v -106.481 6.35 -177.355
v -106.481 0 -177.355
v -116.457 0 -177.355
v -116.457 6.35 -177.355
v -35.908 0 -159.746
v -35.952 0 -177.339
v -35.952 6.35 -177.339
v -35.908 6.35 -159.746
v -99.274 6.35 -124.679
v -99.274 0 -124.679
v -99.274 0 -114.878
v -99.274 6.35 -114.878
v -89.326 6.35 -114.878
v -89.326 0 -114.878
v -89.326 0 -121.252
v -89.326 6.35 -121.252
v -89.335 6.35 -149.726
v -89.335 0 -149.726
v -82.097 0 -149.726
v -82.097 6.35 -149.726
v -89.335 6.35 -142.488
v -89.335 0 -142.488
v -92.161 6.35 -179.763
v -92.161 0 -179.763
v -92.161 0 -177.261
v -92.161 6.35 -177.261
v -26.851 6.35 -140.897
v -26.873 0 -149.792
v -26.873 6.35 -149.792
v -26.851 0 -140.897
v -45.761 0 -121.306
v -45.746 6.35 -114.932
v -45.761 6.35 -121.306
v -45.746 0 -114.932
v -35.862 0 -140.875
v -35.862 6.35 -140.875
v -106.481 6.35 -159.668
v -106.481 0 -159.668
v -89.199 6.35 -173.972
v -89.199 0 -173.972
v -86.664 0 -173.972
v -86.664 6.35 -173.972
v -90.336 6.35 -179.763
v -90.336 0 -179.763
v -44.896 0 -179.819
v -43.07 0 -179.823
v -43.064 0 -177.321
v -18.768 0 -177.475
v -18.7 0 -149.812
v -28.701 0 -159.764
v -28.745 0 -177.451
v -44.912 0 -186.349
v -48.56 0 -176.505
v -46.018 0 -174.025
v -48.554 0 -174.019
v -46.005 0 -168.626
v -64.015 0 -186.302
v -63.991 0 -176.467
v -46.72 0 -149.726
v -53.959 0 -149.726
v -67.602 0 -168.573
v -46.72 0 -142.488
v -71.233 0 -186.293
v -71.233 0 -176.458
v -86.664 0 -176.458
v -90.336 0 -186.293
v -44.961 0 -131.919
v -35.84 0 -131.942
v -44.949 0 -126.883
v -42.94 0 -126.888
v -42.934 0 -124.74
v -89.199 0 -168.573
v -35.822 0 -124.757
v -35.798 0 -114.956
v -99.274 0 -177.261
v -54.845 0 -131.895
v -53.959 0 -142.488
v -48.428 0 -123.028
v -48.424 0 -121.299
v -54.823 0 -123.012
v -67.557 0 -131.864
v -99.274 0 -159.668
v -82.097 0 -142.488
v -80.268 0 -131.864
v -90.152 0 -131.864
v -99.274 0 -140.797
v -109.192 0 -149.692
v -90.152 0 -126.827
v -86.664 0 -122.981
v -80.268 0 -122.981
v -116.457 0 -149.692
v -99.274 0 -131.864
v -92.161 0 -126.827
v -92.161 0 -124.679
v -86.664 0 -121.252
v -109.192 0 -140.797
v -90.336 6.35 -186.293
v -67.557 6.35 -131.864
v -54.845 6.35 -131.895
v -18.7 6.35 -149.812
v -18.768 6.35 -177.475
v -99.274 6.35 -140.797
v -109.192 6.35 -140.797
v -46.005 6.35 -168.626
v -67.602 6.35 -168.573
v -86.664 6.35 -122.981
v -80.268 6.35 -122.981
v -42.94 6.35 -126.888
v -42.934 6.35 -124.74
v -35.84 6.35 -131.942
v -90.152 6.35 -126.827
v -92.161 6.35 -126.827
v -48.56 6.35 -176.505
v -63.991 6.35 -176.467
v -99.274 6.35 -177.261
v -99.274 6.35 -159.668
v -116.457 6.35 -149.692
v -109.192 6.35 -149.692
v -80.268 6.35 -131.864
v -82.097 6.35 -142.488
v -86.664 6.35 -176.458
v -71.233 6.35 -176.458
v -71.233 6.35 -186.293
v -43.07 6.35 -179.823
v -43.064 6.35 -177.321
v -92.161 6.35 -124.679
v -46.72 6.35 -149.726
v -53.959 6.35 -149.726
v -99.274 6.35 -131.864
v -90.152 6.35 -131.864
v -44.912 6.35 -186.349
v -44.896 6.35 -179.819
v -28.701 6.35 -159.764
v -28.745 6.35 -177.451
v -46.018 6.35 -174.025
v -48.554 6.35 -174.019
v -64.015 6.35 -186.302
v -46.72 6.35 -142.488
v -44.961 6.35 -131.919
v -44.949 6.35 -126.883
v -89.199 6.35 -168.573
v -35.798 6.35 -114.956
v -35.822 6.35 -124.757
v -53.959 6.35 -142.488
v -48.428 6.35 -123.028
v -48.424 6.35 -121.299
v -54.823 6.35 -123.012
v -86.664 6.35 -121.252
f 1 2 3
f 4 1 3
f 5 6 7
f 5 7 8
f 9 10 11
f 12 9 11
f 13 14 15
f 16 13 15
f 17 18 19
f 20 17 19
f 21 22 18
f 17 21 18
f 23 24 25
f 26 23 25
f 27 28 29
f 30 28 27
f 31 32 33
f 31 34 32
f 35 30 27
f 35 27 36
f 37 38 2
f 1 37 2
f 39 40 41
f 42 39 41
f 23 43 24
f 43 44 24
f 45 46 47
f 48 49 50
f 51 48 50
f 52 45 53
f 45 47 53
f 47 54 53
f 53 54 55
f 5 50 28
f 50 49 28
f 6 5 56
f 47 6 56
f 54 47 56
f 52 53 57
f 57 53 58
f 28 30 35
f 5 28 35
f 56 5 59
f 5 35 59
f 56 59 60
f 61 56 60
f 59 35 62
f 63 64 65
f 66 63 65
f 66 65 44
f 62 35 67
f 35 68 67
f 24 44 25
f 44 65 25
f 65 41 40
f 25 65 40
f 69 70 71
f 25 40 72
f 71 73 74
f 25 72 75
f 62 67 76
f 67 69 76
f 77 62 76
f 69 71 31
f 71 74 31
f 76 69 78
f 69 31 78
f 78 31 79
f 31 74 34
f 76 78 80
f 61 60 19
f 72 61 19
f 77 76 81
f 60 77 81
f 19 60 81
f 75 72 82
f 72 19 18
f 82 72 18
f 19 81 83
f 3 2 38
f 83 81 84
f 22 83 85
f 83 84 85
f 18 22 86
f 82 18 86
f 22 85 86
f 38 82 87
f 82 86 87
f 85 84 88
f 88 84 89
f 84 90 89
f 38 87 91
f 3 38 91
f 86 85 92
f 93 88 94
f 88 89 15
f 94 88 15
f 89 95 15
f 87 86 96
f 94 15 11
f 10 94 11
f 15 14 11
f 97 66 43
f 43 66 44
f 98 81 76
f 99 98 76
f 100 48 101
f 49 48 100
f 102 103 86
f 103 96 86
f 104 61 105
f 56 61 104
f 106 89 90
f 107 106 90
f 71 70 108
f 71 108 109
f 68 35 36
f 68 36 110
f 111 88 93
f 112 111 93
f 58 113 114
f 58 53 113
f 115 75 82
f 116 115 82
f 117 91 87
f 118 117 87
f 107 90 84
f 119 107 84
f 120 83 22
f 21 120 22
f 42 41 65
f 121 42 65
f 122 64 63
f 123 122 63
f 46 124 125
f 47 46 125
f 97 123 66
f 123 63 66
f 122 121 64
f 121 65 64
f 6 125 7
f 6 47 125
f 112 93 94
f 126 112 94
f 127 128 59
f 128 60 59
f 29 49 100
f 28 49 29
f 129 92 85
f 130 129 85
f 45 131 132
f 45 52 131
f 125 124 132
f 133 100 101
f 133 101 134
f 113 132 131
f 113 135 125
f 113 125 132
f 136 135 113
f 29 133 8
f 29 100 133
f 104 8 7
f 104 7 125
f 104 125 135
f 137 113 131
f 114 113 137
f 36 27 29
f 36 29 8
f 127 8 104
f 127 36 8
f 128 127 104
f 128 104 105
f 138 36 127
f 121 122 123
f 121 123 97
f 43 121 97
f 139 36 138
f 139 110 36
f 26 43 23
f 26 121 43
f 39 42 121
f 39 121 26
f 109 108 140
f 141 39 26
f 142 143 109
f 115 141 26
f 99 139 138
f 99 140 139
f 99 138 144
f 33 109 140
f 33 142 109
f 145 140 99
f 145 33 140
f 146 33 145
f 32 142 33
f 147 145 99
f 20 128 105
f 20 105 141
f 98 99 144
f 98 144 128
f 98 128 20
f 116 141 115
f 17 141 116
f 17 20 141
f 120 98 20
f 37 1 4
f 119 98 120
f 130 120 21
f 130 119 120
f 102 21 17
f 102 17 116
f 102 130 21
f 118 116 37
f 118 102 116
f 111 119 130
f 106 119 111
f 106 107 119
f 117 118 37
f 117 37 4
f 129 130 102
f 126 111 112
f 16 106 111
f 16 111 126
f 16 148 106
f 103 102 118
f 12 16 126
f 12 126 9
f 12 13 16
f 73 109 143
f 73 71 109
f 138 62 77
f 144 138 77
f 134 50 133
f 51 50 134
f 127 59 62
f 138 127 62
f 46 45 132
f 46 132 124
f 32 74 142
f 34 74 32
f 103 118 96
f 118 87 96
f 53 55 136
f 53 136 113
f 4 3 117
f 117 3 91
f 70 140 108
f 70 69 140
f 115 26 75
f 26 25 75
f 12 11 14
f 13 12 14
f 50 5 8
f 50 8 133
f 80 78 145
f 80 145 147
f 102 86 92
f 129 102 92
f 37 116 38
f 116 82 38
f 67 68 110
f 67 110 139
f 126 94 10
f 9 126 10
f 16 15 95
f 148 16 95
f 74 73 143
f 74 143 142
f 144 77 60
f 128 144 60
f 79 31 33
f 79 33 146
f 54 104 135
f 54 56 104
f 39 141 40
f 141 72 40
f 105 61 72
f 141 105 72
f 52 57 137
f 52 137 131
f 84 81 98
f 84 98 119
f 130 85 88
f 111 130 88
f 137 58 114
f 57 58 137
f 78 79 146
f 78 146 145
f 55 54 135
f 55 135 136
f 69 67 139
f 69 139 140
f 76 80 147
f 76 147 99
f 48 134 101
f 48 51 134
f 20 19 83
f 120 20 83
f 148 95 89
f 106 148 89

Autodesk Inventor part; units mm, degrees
ref_plane "YZ Plane" through (0, 0, 0) normal (1, 0, 0) x (0, 1, 0)
ref_plane "XZ Plane" through (0, 0, 0) normal (0, 1, 0) x (-1, 0, 0)
ref_plane "XY Plane" through (0, 0, 0) normal (0, 0, 1) x (1, 0, 0)
sketch "Sketch1" plane through (0, 0, 0) normal (0, 1, 0) x (-1, 0, 0)
  line L0 (0, 0) -> (464.159, 0) construction
  line L1 (464.159, 0) -> (464.159, -207.7664) construction
  line L2 (464.159, -207.7664) -> (0, -207.7664) construction
  line L3 (0, -207.7664) -> (0, 0) construction
  line L4 (89.199, -168.5726) -> (89.199, -173.9719)
  line L5 (89.199, -173.9719) -> (86.6636, -173.9719)
  line L6 (86.6636, -173.9719) -> (86.6636, -176.4581)
  line L7 (86.6636, -176.4581) -> (71.2328, -176.4581)
  line L8 (71.2328, -176.4581) -> (71.2328, -186.2934)
  line L9 (71.2328, -186.2934) -> (90.3359, -186.2934)
  line L10 (90.3359, -186.2934) -> (90.3359, -179.7626)
  line L11 (90.3359, -179.7626) -> (92.1613, -179.7626)
  line L12 (92.1613, -179.7626) -> (92.1613, -177.2606)
  line L13 (92.1613, -177.2606) -> (99.2738, -177.2606)
  line L14 (99.2738, -177.2606) -> (99.2738, -159.6681)
  line L15 (99.2738, -159.6681) -> (106.4808, -159.6681)
  line L16 (106.4808, -159.6681) -> (106.4808, -177.355)
  line L17 (106.4808, -177.355) -> (116.4572, -177.355)
  line L18 (116.4572, -177.355) -> (116.4572, -149.6917)
  line L19 (116.4572, -149.6917) -> (109.1915, -149.6917)
  line L20 (109.1915, -149.6917) -> (109.1915, -140.7968)
  line L21 (109.1915, -140.7968) -> (99.2738, -140.7968)
  line L22 (99.2738, -140.7968) -> (99.2738, -131.8637)
  line L23 (99.2738, -131.8637) -> (90.1524, -131.8637)
  line L24 (90.1524, -131.8637) -> (90.1524, -126.827)
  line L25 (90.1524, -126.827) -> (92.1613, -126.827)
  line L26 (92.1613, -126.827) -> (92.1613, -124.6793)
  line L27 (92.1613, -124.6793) -> (99.2738, -124.6793)
  line L28 (99.2738, -124.6793) -> (99.2738, -114.8781)
  line L29 (99.2738, -114.8781) -> (89.326, -114.8781)
  line L30 (89.326, -114.8781) -> (89.326, -121.2519)
  line L31 (89.326, -121.2519) -> (86.6636, -121.2519)
  line L32 (86.6636, -121.2519) -> (86.6636, -122.9811)
  line L33 (86.6636, -122.9811) -> (80.2684, -122.9811)
  line L34 (80.2684, -122.9811) -> (80.2684, -131.8637)
  line L35 (67.5567, -131.8637) -> (80.2684, -131.8637)
  line L36 (67.602, -168.5726) -> (89.199, -168.5726)
  line L37 (46.005, -168.6259) -> (46.0183, -174.0251)
  line L38 (46.0183, -174.0251) -> (48.5537, -174.0188)
  line L39 (48.5537, -174.0188) -> (48.5598, -176.5051)
  line L40 (48.5598, -176.5051) -> (63.9906, -176.467)
  line L41 (63.9906, -176.467) -> (64.0148, -186.3023)
  line L42 (64.0148, -186.3023) -> (44.9117, -186.3494)
  line L43 (44.9117, -186.3494) -> (44.8956, -179.8186)
  line L44 (44.8956, -179.8186) -> (43.0703, -179.8231)
  line L45 (43.0703, -179.8231) -> (43.0641, -177.3211)
  line L46 (43.0641, -177.3211) -> (35.9516, -177.3387)
  line L47 (35.9516, -177.3387) -> (35.9083, -159.7462)
  line L48 (35.9083, -159.7462) -> (28.7013, -159.7639)
  line L49 (28.7013, -159.7639) -> (28.7449, -177.4508)
  line L50 (28.7449, -177.4508) -> (18.7685, -177.4754)
  line L51 (18.7685, -177.4754) -> (18.7003, -149.8121)
  line L52 (18.7003, -149.8121) -> (26.8729, -149.792)
  line L53 (26.8729, -149.792) -> (26.8509, -140.8972)
  line L54 (26.8509, -140.8972) -> (35.8617, -140.875)
  line L55 (35.8617, -140.875) -> (35.8397, -131.9419)
  line L56 (35.8397, -131.9419) -> (44.9611, -131.9194)
  line L57 (44.9611, -131.9194) -> (44.9487, -126.8827)
  line L58 (44.9487, -126.8827) -> (42.9398, -126.8877)
  line L59 (42.9398, -126.8877) -> (42.9345, -124.7399)
  line L60 (42.9345, -124.7399) -> (35.822, -124.7574)
  line L61 (35.822, -124.7574) -> (35.7979, -114.9563)
  line L62 (35.7979, -114.9563) -> (45.7457, -114.9318)
  line L63 (45.7457, -114.9318) -> (45.7614, -121.3056)
  line L64 (45.7614, -121.3056) -> (48.4237, -121.299)
  line L65 (48.4237, -121.299) -> (48.428, -123.0282)
  line L66 (48.428, -123.0282) -> (54.8232, -123.0124)
  line L67 (54.8232, -123.0124) -> (54.8451, -131.8951)
  line L68 (67.5567, -131.8637) -> (54.8451, -131.8951)
  line L69 (67.602, -168.5726) -> (46.005, -168.6259)
  line L70 (46.7205, -142.4875) -> (53.9587, -142.4875)
  line L71 (53.9587, -142.4875) -> (53.9587, -149.7258)
  line L72 (53.9587, -149.7258) -> (46.7205, -149.7258)
  line L73 (46.7205, -149.7258) -> (46.7205, -142.4875)
  line L74 (82.0966, -142.4875) -> (89.3348, -142.4875)
  line L75 (89.3348, -142.4875) -> (89.3348, -149.7258)
  line L76 (89.3348, -149.7258) -> (82.0966, -149.7258)
  line L77 (82.0966, -149.7258) -> (82.0966, -142.4875)
  dimension "d30" = 90
  dimension "d32" = 90
  dimension "d34" = 90
  dimension "d35" = 90
  dimension "d36" = 7.2382
  dimension "d39" = 7.2382
  dimension "d40" = 7.2382
  dimension "d41" = 7.2382
  dimension "d43" = 19.8567
  dimension "d44" = 28.1378
extrude "Extrusion1" add sketch "Sketch1" along normal blind 6.35
equation "\"d39\" = d36"
equation "\"d40\" = d36"
properties part number "Monster2"
